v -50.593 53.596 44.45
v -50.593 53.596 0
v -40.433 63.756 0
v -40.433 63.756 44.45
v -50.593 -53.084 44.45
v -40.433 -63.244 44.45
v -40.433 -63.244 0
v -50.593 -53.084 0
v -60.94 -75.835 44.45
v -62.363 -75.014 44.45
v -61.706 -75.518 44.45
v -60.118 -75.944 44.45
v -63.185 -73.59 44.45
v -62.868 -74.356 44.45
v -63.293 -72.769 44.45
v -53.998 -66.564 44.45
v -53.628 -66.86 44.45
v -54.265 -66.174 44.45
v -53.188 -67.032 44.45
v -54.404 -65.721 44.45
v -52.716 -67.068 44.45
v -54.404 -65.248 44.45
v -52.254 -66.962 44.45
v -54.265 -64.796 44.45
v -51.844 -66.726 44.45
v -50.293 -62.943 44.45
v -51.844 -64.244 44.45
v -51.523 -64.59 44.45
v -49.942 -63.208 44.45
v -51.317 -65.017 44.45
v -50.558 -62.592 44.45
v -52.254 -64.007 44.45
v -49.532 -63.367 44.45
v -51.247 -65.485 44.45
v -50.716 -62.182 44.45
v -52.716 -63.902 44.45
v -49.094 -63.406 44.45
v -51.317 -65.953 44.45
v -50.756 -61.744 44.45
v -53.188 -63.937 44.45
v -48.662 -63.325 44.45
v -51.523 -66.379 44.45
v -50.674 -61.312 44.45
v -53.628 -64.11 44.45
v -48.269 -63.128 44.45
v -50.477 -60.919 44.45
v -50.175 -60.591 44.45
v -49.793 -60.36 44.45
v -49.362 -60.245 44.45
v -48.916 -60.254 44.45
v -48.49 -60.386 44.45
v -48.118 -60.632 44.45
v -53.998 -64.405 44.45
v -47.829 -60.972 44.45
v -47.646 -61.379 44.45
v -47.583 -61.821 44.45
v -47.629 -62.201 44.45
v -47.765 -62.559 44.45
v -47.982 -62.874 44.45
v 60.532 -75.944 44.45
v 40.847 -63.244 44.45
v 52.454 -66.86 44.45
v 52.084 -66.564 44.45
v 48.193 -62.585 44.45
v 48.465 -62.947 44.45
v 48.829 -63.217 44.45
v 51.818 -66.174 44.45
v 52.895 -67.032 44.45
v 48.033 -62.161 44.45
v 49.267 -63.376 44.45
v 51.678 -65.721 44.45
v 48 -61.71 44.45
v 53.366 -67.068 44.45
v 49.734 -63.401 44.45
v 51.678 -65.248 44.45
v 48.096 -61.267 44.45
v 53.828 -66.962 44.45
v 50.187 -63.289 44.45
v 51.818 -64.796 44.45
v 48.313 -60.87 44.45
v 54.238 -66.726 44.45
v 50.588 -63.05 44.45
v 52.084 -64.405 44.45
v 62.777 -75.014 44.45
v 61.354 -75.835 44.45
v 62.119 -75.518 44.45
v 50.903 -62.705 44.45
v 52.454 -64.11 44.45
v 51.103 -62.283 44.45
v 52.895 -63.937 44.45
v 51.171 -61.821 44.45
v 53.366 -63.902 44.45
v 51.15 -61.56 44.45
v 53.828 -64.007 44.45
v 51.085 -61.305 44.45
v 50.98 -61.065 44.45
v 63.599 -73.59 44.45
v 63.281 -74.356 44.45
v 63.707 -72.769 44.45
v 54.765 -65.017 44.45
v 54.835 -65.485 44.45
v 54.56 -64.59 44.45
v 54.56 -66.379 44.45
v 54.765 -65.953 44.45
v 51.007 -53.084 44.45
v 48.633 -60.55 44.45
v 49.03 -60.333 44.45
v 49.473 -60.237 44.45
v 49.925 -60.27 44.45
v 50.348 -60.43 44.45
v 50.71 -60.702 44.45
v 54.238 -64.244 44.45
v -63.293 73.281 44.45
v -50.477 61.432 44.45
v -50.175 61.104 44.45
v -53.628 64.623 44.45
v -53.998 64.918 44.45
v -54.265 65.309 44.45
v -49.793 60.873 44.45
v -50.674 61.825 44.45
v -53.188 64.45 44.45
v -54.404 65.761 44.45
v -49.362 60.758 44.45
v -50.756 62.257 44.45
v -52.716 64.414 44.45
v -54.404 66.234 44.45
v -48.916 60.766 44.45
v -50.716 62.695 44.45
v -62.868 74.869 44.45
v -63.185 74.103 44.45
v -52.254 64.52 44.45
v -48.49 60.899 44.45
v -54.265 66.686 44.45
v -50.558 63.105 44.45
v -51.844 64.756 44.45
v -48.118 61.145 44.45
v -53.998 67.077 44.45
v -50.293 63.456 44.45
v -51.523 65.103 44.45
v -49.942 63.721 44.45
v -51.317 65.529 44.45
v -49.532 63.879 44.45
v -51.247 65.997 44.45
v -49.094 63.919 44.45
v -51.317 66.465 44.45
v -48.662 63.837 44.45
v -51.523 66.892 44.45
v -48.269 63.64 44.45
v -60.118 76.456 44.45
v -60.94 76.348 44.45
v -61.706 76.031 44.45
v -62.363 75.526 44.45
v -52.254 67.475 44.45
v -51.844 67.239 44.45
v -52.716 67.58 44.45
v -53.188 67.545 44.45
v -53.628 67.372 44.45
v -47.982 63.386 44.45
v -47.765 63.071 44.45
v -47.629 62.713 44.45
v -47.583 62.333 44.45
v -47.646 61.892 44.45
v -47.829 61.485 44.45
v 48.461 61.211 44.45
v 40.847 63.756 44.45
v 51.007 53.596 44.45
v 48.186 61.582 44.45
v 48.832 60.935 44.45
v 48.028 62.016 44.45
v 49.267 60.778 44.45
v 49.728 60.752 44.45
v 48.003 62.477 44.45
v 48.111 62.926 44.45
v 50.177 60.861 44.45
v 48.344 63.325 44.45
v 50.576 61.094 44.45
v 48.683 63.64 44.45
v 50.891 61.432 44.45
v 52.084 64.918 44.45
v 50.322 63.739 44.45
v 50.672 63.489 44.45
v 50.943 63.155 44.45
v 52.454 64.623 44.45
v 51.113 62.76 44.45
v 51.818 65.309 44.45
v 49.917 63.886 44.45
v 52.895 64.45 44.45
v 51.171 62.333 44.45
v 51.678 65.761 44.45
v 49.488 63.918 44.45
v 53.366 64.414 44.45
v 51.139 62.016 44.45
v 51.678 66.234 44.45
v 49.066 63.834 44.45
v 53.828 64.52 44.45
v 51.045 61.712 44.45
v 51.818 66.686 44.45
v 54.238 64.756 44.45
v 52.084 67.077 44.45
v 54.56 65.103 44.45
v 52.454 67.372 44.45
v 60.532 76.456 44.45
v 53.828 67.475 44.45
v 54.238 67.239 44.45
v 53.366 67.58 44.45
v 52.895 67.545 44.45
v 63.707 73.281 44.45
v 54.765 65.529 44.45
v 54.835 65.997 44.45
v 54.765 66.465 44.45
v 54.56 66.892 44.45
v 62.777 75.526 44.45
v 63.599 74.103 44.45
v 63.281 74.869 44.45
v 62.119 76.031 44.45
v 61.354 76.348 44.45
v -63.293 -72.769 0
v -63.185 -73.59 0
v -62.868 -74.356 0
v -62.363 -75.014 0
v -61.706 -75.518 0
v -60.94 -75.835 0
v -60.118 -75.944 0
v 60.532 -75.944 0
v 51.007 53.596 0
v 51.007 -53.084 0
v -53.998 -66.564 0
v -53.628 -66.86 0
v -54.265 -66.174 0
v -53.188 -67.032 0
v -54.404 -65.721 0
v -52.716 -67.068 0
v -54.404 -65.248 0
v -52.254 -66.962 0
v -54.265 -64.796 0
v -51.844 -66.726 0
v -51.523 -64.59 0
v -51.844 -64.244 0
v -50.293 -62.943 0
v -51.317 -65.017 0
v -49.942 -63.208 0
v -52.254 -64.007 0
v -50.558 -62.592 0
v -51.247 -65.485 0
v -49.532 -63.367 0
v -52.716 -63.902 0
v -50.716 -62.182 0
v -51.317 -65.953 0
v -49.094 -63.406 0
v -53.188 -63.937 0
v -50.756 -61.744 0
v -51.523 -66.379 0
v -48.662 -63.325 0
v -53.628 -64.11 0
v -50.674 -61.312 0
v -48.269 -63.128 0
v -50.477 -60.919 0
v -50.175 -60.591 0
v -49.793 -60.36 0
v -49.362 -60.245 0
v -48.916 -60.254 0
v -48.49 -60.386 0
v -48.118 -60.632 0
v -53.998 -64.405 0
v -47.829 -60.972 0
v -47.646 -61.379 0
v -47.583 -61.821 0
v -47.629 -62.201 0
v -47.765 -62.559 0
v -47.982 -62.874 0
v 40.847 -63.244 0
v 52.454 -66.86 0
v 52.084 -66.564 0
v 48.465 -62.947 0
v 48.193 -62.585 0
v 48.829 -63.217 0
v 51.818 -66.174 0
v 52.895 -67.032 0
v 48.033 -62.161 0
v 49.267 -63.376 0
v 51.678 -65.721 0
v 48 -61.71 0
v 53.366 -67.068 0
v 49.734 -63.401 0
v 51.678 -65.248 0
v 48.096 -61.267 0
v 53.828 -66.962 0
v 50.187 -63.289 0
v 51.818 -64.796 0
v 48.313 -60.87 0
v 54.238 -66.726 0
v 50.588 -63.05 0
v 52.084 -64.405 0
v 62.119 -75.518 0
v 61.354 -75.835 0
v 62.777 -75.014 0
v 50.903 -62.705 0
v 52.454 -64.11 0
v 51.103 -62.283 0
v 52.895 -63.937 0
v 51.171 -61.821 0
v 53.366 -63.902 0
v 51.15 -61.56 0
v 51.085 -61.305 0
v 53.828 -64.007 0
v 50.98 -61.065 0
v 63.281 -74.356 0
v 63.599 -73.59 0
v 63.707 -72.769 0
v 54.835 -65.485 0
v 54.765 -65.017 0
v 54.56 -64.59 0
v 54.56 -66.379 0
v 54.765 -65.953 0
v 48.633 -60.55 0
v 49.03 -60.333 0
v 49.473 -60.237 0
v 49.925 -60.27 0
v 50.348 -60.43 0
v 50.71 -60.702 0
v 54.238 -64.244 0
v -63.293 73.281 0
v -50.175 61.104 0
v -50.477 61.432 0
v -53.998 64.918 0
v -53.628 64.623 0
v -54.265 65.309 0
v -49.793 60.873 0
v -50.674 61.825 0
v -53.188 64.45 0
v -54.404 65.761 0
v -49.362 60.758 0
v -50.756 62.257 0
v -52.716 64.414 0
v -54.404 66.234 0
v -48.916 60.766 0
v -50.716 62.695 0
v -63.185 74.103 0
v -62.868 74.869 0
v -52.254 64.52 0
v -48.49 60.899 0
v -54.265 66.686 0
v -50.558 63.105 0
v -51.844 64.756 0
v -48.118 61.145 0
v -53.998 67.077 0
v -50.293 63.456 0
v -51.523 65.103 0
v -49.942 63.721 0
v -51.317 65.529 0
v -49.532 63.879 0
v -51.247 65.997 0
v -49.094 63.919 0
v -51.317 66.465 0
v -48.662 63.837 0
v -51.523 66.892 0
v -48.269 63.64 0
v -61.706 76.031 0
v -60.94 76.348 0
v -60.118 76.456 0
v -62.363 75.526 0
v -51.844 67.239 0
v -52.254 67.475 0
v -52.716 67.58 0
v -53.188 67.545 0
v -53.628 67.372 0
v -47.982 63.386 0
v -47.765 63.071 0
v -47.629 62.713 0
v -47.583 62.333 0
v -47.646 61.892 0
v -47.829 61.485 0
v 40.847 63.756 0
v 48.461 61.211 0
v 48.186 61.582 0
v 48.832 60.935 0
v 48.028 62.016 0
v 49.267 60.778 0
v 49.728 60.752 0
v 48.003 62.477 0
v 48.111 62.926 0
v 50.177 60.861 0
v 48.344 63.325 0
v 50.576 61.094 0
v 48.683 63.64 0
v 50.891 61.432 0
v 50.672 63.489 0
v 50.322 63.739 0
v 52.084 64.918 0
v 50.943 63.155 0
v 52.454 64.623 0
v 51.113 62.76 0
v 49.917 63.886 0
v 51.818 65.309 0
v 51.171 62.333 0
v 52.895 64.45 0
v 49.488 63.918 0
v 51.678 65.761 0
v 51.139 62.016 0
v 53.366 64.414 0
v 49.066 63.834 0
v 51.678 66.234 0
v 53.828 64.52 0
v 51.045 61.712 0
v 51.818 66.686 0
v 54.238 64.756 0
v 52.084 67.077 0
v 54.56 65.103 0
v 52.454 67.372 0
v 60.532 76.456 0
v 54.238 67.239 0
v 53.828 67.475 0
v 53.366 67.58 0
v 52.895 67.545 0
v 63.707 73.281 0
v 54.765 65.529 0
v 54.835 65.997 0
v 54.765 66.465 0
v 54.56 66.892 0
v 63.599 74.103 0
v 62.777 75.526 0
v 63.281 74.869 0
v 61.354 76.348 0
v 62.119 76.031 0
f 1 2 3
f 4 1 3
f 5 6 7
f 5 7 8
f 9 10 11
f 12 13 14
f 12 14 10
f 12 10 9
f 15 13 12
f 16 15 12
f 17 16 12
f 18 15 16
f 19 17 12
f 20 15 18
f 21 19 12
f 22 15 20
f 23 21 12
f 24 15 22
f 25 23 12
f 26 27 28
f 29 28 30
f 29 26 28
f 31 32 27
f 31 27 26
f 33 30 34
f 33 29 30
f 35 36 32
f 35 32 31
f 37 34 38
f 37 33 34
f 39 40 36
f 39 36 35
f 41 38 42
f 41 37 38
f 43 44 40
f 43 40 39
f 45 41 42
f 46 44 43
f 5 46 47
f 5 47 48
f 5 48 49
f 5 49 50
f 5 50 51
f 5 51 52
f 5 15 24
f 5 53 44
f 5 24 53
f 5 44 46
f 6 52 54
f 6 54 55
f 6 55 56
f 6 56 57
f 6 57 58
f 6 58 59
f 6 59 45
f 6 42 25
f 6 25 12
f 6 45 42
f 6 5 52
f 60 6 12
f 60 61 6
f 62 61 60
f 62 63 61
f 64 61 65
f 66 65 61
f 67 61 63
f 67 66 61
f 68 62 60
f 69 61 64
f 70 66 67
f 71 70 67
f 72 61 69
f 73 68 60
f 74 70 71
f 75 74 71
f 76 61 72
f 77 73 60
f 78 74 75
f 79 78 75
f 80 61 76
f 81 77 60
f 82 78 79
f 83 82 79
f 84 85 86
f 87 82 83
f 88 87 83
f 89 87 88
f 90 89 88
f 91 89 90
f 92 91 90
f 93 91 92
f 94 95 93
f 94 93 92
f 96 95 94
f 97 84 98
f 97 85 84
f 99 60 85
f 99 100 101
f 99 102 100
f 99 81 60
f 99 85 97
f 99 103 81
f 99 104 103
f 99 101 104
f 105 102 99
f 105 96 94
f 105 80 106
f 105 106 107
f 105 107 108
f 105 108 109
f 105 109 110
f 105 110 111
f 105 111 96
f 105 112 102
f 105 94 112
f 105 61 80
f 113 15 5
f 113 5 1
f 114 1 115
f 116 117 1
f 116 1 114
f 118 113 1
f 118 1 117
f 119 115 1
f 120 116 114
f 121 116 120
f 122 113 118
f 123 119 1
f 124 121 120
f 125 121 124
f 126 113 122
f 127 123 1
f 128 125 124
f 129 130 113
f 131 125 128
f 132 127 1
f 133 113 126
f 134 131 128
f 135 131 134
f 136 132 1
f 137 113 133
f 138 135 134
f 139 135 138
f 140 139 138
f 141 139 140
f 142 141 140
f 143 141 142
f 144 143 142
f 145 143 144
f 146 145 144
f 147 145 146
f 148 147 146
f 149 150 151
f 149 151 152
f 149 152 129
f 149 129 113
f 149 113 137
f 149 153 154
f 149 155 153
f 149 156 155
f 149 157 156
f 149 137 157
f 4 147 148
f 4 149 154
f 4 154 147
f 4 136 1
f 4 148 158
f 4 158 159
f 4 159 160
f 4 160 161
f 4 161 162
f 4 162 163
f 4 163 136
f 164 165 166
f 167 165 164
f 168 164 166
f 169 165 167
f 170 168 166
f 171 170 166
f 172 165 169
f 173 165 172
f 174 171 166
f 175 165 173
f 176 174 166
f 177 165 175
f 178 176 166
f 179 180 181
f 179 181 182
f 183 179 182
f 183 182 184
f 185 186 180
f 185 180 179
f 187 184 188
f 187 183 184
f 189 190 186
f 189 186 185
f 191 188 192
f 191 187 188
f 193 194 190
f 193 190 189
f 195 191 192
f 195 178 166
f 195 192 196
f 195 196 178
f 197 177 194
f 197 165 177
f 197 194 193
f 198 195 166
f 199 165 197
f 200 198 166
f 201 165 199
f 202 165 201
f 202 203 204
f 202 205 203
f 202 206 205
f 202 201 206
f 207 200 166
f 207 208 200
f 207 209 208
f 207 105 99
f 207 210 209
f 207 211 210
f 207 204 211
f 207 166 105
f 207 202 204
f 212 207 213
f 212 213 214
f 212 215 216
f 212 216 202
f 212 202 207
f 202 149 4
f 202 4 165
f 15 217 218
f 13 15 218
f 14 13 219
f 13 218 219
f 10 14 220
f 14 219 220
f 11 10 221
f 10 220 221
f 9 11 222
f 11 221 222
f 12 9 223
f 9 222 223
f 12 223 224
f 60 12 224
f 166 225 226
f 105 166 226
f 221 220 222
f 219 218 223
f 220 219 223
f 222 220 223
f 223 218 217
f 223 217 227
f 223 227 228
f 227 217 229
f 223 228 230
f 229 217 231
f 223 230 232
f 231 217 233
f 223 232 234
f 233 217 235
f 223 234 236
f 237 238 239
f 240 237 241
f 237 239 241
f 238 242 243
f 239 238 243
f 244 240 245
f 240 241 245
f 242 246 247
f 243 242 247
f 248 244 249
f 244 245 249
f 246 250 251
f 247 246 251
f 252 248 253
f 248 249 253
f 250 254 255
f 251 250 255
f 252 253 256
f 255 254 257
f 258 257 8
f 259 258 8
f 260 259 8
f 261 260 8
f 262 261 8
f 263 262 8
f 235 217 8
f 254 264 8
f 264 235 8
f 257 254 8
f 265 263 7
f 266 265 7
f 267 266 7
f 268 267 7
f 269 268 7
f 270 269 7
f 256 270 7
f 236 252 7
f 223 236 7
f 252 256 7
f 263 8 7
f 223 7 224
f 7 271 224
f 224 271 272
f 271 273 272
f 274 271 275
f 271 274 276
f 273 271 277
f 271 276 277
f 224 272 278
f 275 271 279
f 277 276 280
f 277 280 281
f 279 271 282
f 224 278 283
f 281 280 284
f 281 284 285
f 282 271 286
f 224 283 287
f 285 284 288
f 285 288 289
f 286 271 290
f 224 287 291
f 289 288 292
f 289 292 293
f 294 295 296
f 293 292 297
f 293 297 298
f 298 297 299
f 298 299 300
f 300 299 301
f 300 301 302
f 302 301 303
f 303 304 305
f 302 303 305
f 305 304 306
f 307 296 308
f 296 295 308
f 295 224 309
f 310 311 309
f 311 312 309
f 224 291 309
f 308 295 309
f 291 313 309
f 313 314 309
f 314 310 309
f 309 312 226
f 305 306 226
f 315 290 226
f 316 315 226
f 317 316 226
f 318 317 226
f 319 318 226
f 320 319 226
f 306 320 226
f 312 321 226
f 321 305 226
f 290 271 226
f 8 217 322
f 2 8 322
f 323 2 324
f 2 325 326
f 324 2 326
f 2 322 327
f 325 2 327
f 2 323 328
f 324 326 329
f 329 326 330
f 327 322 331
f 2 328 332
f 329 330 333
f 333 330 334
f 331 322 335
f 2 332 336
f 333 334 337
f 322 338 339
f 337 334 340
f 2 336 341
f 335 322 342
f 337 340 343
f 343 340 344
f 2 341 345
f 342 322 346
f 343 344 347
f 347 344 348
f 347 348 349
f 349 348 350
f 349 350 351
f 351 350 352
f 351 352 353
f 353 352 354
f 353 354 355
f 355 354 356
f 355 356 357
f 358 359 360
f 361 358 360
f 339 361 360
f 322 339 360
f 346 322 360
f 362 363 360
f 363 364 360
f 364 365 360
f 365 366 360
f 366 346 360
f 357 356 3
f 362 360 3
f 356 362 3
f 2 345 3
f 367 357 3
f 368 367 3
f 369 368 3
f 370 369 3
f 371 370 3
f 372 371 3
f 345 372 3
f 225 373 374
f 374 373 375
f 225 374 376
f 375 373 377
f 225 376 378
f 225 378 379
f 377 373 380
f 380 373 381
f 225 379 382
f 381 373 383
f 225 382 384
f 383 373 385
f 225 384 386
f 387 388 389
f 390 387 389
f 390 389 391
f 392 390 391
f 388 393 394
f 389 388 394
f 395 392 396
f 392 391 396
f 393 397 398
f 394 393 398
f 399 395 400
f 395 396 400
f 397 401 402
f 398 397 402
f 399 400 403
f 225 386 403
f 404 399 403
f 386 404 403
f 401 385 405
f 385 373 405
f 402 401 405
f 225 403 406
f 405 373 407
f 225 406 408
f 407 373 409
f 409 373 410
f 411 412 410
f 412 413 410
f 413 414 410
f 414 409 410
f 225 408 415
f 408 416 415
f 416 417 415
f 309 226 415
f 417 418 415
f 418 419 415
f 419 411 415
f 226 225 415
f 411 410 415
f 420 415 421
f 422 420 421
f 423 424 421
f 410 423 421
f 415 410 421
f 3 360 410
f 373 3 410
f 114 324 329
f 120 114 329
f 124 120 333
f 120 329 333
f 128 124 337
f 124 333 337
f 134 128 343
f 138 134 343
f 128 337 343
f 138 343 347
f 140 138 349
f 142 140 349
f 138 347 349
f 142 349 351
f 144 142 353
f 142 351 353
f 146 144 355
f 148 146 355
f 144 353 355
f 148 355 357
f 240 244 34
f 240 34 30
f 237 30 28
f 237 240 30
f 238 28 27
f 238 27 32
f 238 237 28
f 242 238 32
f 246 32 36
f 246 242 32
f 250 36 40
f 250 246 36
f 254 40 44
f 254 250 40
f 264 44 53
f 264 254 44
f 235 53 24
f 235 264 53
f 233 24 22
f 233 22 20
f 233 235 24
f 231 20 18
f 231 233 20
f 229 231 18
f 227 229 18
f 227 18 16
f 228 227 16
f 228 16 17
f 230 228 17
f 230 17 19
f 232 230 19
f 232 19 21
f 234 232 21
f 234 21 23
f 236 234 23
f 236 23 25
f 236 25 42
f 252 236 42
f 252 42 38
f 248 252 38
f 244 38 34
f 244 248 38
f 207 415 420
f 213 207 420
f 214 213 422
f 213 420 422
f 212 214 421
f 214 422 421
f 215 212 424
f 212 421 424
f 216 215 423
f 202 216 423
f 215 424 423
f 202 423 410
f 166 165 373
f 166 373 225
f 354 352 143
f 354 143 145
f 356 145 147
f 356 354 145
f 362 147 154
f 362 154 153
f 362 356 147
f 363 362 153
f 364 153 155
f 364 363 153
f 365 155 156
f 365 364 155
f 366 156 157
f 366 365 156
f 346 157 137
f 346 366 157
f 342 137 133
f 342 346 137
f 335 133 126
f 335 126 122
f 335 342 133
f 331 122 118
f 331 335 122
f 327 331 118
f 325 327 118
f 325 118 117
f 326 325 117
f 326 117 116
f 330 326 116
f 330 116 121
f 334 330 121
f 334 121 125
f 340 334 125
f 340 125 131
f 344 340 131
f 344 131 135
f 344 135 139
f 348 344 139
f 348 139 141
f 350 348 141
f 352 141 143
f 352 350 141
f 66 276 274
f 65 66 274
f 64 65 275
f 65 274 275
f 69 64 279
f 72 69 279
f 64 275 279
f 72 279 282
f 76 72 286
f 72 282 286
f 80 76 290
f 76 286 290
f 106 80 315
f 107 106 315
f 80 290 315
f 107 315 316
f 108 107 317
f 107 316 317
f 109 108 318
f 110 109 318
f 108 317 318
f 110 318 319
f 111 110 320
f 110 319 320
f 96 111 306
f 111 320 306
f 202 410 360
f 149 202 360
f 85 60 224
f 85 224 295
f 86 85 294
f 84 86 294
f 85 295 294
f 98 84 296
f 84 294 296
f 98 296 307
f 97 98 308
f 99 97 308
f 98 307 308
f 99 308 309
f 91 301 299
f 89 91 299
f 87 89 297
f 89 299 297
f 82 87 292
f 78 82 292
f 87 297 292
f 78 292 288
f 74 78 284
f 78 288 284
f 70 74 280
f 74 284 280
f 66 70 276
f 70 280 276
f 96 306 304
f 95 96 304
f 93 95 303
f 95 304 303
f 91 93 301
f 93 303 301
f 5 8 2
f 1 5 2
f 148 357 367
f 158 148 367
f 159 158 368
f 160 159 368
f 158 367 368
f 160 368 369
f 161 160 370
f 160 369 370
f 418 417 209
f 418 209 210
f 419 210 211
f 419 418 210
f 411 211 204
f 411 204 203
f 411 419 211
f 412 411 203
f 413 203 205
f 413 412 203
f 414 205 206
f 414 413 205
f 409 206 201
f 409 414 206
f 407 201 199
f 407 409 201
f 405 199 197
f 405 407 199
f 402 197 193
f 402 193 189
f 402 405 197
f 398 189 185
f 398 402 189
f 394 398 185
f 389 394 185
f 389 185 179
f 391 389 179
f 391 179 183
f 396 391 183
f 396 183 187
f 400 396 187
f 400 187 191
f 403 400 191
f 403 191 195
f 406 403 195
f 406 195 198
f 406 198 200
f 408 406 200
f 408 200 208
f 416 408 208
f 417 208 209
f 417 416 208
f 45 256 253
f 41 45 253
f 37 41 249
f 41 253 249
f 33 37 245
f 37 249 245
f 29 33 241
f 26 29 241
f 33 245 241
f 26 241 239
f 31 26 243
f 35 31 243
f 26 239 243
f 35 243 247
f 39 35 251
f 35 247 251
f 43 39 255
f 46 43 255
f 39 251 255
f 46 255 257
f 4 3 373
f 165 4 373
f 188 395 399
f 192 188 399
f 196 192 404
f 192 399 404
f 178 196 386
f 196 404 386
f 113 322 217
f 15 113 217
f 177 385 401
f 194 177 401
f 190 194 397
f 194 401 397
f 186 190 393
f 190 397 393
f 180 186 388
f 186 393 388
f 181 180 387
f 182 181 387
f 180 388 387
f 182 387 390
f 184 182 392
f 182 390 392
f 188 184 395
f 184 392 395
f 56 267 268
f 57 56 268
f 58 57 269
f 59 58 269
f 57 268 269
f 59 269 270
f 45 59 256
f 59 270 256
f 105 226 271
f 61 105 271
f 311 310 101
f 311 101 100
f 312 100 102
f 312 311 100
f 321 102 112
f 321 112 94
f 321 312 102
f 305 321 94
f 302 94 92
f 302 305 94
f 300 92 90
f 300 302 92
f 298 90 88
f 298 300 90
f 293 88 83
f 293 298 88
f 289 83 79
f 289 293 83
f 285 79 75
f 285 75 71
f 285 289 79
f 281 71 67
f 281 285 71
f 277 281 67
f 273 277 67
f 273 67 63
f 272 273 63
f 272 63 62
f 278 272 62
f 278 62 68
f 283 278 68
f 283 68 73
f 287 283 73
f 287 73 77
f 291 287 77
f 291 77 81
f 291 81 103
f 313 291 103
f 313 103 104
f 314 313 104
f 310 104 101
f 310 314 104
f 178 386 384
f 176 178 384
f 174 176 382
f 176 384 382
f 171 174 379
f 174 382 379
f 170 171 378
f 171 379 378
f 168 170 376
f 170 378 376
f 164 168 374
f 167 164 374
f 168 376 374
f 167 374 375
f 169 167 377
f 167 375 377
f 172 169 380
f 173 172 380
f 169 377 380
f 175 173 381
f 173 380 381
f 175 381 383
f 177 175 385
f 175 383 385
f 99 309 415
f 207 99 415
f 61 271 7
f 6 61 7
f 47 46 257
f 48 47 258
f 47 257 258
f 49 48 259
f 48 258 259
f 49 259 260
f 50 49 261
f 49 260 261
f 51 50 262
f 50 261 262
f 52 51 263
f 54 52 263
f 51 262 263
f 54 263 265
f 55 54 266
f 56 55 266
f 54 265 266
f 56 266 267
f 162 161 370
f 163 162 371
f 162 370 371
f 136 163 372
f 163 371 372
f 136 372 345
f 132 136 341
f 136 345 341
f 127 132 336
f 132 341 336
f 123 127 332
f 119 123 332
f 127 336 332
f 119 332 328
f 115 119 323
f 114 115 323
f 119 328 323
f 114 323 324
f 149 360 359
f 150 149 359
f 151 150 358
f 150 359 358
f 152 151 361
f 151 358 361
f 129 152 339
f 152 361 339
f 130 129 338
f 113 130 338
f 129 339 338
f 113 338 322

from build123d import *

# Parameters (mm, degrees)
F0_R     = 1.5875
F1_DEPTH = 44.45


with BuildPart() as f1:
    # F0 (on Top) → F1 (new body)
    with BuildSketch(Plane.XY):
        with BuildLine():
            Line((60.531797, 76.456334), (-60.118203, 76.456334))
            ThreePointArc((-60.118203, 76.456334), (-62.363267, 75.526399), (-63.293203, 73.281334))
            Line((-63.293203, 73.281334), (-63.293203, -72.768666))
            ThreePointArc((-63.293203, -72.768666), (-62.363267, -75.01373), (-60.118203, -75.943666))
            Line((-60.118203, -75.943666), (60.531797, -75.943666))
            ThreePointArc((60.531797, -75.943666), (62.776861, -75.01373), (63.706797, -72.768666))
            Line((63.706797, -72.768666), (63.706797, 73.281334))
            ThreePointArc((63.706797, 73.281334), (62.776861, 75.526399), (60.531797, 76.456334))
        make_face()
        with BuildLine():
            ThreePointArc((-56.943203, 66.931334), (-56.013267, 69.176399), (-53.768203, 70.106334))
            Line((-53.768203, 70.106334), (54.181797, 70.106334))
            ThreePointArc((54.181797, 70.106334), (56.426861, 69.176399), (57.356797, 66.931334))
            Line((57.356797, 66.931334), (57.356797, -66.418666))
            ThreePointArc((57.356797, -66.418666), (56.426861, -68.66373), (54.181797, -69.593666))
            Line((54.181797, -69.593666), (-53.768203, -69.593666))
            ThreePointArc((-53.768203, -69.593666), (-56.013267, -68.66373), (-56.943203, -66.418666))
            Line((-56.943203, -66.418666), (-56.943203, 66.931334))
        make_face(mode=Mode.SUBTRACT)
        with BuildLine():
            Line((54.181797, 70.106334), (-53.768203, 70.106334))
            ThreePointArc((-53.768203, 70.106334), (-56.013267, 69.176399), (-56.943203, 66.931334))
            Line((-56.943203, 66.931334), (-56.943203, -66.418666))
            ThreePointArc((-56.943203, -66.418666), (-56.013267, -68.66373), (-53.768203, -69.593666))
            Line((-53.768203, -69.593666), (54.181797, -69.593666))
            ThreePointArc((54.181797, -69.593666), (56.426861, -68.66373), (57.356797, -66.418666))
            Line((57.356797, -66.418666), (57.356797, 66.931334))
            ThreePointArc((57.356797, 66.931334), (56.426861, 69.176399), (54.181797, 70.106334))
        make_face()
        with Locations((-52.834257, -65.484719)):
            Circle(F0_R, mode=Mode.SUBTRACT)
        with BuildLine():
            ThreePointArc((-48.268948, 63.640233), (-47.847518, 63.727175), (-47.418203, 63.756334))
            Line((-47.418203, 63.756334), (-40.433203, 63.756334))
            Line((-40.433203, 63.756334), (40.846797, 63.756334))
            Line((40.846797, 63.756334), (47.831797, 63.756334))
            ThreePointArc((47.831797, 63.756334), (48.261112, 63.727175), (48.682541, 63.640233))
            ThreePointArc((48.682541, 63.640233), (50.321889, 63.738981), (51.171406, 62.333443))
            ThreePointArc((51.171406, 62.333443), (51.099604, 61.861412), (50.890695, 61.432079))
            ThreePointArc((50.890695, 61.432079), (50.977637, 61.01065), (51.006797, 60.581334))
            Line((51.006797, 60.581334), (51.006797, 53.596334))
            Line((51.006797, 53.596334), (51.006797, -53.083666))
            Line((51.006797, -53.083666), (51.006797, -60.698242))
            ThreePointArc((51.006797, -60.698242), (51.000133, -60.882306), (50.980177, -61.065405))
            ThreePointArc((50.980177, -61.065405), (51.122856, -61.431175), (51.171406, -61.820774))
            ThreePointArc((51.171406, -61.820774), (50.39662, -63.184465), (48.828536, -63.217046))
            ThreePointArc((48.828536, -63.217046), (48.645437, -63.237002), (48.461374, -63.243666))
            Line((48.461374, -63.243666), (40.846797, -63.243666))
            Line((40.846797, -63.243666), (-40.433203, -63.243666))
            Line((-40.433203, -63.243666), (-47.418203, -63.243666))
            ThreePointArc((-47.418203, -63.243666), (-47.847518, -63.214506), (-48.268948, -63.127564))
            ThreePointArc((-48.268948, -63.127564), (-50.292844, -62.943306), (-50.477102, -60.91941))
            ThreePointArc((-50.477102, -60.91941), (-50.564044, -60.497981), (-50.593203, -60.068666))
            Line((-50.593203, -60.068666), (-50.593203, -53.083666))
            Line((-50.593203, -53.083666), (-50.593203, 53.596334))
            Line((-50.593203, 53.596334), (-50.593203, 60.581334))
            ThreePointArc((-50.593203, 60.581334), (-50.564044, 61.01065), (-50.477102, 61.432079))
            ThreePointArc((-50.477102, 61.432079), (-50.292844, 63.455975), (-48.268948, 63.640233))
        make_face(mode=Mode.SUBTRACT)
        with Locations((53.24785, -65.484719)):
            Circle(F0_R, mode=Mode.SUBTRACT)
        with Locations((-52.834257, 65.997388)):
            Circle(F0_R, mode=Mode.SUBTRACT)
        with Locations((53.24785, 65.997388)):
            Circle(F0_R, mode=Mode.SUBTRACT)
        with BuildLine():
            Line((-40.433203, 63.756334), (-47.418203, 63.756334))
            ThreePointArc((-47.418203, 63.756334), (-47.847518, 63.727175), (-48.268948, 63.640233))
            ThreePointArc((-48.268948, 63.640233), (-47.764774, 63.071427), (-47.582812, 62.333443))
            ThreePointArc((-47.582812, 62.333443), (-48.69828, 60.817745), (-50.477102, 61.432079))
            ThreePointArc((-50.477102, 61.432079), (-50.564044, 61.01065), (-50.593203, 60.581334))
            Line((-50.593203, 60.581334), (-50.593203, 53.596334))
            Line((-50.593203, 53.596334), (-40.433203, 63.756334))
        make_face()
        with BuildLine():
            Line((47.831797, 63.756334), (40.846797, 63.756334))
            Line((40.846797, 63.756334), (51.006797, 53.596334))
            Line((51.006797, 53.596334), (51.006797, 60.581334))
            ThreePointArc((51.006797, 60.581334), (50.977637, 61.01065), (50.890695, 61.432079))
            ThreePointArc((50.890695, 61.432079), (48.461374, 61.210911), (48.682541, 63.640233))
            ThreePointArc((48.682541, 63.640233), (48.261112, 63.727175), (47.831797, 63.756334))
        make_face()
        with BuildLine():
            Line((51.006797, -60.698242), (51.006797, -53.083666))
            Line((51.006797, -53.083666), (40.846797, -63.243666))
            Line((40.846797, -63.243666), (48.461374, -63.243666))
            ThreePointArc((48.461374, -63.243666), (48.645437, -63.237002), (48.828536, -63.217046))
            ThreePointArc((48.828536, -63.217046), (48.461374, -60.698242), (50.980177, -61.065405))
            ThreePointArc((50.980177, -61.065405), (51.000133, -60.882306), (51.006797, -60.698242))
        make_face()
        with BuildLine():
            Line((-40.433203, -63.243666), (-50.593203, -53.083666))
            Line((-50.593203, -53.083666), (-50.593203, -60.068666))
            ThreePointArc((-50.593203, -60.068666), (-50.564044, -60.497981), (-50.477102, -60.91941))
            ThreePointArc((-50.477102, -60.91941), (-48.69828, -60.305076), (-47.582812, -61.820774))
            ThreePointArc((-47.582812, -61.820774), (-47.764774, -62.558758), (-48.268948, -63.127564))
            ThreePointArc((-48.268948, -63.127564), (-47.847518, -63.214506), (-47.418203, -63.243666))
            Line((-47.418203, -63.243666), (-40.433203, -63.243666))
        make_face()
    extrude(amount=F1_DEPTH)


solid = f1.part
